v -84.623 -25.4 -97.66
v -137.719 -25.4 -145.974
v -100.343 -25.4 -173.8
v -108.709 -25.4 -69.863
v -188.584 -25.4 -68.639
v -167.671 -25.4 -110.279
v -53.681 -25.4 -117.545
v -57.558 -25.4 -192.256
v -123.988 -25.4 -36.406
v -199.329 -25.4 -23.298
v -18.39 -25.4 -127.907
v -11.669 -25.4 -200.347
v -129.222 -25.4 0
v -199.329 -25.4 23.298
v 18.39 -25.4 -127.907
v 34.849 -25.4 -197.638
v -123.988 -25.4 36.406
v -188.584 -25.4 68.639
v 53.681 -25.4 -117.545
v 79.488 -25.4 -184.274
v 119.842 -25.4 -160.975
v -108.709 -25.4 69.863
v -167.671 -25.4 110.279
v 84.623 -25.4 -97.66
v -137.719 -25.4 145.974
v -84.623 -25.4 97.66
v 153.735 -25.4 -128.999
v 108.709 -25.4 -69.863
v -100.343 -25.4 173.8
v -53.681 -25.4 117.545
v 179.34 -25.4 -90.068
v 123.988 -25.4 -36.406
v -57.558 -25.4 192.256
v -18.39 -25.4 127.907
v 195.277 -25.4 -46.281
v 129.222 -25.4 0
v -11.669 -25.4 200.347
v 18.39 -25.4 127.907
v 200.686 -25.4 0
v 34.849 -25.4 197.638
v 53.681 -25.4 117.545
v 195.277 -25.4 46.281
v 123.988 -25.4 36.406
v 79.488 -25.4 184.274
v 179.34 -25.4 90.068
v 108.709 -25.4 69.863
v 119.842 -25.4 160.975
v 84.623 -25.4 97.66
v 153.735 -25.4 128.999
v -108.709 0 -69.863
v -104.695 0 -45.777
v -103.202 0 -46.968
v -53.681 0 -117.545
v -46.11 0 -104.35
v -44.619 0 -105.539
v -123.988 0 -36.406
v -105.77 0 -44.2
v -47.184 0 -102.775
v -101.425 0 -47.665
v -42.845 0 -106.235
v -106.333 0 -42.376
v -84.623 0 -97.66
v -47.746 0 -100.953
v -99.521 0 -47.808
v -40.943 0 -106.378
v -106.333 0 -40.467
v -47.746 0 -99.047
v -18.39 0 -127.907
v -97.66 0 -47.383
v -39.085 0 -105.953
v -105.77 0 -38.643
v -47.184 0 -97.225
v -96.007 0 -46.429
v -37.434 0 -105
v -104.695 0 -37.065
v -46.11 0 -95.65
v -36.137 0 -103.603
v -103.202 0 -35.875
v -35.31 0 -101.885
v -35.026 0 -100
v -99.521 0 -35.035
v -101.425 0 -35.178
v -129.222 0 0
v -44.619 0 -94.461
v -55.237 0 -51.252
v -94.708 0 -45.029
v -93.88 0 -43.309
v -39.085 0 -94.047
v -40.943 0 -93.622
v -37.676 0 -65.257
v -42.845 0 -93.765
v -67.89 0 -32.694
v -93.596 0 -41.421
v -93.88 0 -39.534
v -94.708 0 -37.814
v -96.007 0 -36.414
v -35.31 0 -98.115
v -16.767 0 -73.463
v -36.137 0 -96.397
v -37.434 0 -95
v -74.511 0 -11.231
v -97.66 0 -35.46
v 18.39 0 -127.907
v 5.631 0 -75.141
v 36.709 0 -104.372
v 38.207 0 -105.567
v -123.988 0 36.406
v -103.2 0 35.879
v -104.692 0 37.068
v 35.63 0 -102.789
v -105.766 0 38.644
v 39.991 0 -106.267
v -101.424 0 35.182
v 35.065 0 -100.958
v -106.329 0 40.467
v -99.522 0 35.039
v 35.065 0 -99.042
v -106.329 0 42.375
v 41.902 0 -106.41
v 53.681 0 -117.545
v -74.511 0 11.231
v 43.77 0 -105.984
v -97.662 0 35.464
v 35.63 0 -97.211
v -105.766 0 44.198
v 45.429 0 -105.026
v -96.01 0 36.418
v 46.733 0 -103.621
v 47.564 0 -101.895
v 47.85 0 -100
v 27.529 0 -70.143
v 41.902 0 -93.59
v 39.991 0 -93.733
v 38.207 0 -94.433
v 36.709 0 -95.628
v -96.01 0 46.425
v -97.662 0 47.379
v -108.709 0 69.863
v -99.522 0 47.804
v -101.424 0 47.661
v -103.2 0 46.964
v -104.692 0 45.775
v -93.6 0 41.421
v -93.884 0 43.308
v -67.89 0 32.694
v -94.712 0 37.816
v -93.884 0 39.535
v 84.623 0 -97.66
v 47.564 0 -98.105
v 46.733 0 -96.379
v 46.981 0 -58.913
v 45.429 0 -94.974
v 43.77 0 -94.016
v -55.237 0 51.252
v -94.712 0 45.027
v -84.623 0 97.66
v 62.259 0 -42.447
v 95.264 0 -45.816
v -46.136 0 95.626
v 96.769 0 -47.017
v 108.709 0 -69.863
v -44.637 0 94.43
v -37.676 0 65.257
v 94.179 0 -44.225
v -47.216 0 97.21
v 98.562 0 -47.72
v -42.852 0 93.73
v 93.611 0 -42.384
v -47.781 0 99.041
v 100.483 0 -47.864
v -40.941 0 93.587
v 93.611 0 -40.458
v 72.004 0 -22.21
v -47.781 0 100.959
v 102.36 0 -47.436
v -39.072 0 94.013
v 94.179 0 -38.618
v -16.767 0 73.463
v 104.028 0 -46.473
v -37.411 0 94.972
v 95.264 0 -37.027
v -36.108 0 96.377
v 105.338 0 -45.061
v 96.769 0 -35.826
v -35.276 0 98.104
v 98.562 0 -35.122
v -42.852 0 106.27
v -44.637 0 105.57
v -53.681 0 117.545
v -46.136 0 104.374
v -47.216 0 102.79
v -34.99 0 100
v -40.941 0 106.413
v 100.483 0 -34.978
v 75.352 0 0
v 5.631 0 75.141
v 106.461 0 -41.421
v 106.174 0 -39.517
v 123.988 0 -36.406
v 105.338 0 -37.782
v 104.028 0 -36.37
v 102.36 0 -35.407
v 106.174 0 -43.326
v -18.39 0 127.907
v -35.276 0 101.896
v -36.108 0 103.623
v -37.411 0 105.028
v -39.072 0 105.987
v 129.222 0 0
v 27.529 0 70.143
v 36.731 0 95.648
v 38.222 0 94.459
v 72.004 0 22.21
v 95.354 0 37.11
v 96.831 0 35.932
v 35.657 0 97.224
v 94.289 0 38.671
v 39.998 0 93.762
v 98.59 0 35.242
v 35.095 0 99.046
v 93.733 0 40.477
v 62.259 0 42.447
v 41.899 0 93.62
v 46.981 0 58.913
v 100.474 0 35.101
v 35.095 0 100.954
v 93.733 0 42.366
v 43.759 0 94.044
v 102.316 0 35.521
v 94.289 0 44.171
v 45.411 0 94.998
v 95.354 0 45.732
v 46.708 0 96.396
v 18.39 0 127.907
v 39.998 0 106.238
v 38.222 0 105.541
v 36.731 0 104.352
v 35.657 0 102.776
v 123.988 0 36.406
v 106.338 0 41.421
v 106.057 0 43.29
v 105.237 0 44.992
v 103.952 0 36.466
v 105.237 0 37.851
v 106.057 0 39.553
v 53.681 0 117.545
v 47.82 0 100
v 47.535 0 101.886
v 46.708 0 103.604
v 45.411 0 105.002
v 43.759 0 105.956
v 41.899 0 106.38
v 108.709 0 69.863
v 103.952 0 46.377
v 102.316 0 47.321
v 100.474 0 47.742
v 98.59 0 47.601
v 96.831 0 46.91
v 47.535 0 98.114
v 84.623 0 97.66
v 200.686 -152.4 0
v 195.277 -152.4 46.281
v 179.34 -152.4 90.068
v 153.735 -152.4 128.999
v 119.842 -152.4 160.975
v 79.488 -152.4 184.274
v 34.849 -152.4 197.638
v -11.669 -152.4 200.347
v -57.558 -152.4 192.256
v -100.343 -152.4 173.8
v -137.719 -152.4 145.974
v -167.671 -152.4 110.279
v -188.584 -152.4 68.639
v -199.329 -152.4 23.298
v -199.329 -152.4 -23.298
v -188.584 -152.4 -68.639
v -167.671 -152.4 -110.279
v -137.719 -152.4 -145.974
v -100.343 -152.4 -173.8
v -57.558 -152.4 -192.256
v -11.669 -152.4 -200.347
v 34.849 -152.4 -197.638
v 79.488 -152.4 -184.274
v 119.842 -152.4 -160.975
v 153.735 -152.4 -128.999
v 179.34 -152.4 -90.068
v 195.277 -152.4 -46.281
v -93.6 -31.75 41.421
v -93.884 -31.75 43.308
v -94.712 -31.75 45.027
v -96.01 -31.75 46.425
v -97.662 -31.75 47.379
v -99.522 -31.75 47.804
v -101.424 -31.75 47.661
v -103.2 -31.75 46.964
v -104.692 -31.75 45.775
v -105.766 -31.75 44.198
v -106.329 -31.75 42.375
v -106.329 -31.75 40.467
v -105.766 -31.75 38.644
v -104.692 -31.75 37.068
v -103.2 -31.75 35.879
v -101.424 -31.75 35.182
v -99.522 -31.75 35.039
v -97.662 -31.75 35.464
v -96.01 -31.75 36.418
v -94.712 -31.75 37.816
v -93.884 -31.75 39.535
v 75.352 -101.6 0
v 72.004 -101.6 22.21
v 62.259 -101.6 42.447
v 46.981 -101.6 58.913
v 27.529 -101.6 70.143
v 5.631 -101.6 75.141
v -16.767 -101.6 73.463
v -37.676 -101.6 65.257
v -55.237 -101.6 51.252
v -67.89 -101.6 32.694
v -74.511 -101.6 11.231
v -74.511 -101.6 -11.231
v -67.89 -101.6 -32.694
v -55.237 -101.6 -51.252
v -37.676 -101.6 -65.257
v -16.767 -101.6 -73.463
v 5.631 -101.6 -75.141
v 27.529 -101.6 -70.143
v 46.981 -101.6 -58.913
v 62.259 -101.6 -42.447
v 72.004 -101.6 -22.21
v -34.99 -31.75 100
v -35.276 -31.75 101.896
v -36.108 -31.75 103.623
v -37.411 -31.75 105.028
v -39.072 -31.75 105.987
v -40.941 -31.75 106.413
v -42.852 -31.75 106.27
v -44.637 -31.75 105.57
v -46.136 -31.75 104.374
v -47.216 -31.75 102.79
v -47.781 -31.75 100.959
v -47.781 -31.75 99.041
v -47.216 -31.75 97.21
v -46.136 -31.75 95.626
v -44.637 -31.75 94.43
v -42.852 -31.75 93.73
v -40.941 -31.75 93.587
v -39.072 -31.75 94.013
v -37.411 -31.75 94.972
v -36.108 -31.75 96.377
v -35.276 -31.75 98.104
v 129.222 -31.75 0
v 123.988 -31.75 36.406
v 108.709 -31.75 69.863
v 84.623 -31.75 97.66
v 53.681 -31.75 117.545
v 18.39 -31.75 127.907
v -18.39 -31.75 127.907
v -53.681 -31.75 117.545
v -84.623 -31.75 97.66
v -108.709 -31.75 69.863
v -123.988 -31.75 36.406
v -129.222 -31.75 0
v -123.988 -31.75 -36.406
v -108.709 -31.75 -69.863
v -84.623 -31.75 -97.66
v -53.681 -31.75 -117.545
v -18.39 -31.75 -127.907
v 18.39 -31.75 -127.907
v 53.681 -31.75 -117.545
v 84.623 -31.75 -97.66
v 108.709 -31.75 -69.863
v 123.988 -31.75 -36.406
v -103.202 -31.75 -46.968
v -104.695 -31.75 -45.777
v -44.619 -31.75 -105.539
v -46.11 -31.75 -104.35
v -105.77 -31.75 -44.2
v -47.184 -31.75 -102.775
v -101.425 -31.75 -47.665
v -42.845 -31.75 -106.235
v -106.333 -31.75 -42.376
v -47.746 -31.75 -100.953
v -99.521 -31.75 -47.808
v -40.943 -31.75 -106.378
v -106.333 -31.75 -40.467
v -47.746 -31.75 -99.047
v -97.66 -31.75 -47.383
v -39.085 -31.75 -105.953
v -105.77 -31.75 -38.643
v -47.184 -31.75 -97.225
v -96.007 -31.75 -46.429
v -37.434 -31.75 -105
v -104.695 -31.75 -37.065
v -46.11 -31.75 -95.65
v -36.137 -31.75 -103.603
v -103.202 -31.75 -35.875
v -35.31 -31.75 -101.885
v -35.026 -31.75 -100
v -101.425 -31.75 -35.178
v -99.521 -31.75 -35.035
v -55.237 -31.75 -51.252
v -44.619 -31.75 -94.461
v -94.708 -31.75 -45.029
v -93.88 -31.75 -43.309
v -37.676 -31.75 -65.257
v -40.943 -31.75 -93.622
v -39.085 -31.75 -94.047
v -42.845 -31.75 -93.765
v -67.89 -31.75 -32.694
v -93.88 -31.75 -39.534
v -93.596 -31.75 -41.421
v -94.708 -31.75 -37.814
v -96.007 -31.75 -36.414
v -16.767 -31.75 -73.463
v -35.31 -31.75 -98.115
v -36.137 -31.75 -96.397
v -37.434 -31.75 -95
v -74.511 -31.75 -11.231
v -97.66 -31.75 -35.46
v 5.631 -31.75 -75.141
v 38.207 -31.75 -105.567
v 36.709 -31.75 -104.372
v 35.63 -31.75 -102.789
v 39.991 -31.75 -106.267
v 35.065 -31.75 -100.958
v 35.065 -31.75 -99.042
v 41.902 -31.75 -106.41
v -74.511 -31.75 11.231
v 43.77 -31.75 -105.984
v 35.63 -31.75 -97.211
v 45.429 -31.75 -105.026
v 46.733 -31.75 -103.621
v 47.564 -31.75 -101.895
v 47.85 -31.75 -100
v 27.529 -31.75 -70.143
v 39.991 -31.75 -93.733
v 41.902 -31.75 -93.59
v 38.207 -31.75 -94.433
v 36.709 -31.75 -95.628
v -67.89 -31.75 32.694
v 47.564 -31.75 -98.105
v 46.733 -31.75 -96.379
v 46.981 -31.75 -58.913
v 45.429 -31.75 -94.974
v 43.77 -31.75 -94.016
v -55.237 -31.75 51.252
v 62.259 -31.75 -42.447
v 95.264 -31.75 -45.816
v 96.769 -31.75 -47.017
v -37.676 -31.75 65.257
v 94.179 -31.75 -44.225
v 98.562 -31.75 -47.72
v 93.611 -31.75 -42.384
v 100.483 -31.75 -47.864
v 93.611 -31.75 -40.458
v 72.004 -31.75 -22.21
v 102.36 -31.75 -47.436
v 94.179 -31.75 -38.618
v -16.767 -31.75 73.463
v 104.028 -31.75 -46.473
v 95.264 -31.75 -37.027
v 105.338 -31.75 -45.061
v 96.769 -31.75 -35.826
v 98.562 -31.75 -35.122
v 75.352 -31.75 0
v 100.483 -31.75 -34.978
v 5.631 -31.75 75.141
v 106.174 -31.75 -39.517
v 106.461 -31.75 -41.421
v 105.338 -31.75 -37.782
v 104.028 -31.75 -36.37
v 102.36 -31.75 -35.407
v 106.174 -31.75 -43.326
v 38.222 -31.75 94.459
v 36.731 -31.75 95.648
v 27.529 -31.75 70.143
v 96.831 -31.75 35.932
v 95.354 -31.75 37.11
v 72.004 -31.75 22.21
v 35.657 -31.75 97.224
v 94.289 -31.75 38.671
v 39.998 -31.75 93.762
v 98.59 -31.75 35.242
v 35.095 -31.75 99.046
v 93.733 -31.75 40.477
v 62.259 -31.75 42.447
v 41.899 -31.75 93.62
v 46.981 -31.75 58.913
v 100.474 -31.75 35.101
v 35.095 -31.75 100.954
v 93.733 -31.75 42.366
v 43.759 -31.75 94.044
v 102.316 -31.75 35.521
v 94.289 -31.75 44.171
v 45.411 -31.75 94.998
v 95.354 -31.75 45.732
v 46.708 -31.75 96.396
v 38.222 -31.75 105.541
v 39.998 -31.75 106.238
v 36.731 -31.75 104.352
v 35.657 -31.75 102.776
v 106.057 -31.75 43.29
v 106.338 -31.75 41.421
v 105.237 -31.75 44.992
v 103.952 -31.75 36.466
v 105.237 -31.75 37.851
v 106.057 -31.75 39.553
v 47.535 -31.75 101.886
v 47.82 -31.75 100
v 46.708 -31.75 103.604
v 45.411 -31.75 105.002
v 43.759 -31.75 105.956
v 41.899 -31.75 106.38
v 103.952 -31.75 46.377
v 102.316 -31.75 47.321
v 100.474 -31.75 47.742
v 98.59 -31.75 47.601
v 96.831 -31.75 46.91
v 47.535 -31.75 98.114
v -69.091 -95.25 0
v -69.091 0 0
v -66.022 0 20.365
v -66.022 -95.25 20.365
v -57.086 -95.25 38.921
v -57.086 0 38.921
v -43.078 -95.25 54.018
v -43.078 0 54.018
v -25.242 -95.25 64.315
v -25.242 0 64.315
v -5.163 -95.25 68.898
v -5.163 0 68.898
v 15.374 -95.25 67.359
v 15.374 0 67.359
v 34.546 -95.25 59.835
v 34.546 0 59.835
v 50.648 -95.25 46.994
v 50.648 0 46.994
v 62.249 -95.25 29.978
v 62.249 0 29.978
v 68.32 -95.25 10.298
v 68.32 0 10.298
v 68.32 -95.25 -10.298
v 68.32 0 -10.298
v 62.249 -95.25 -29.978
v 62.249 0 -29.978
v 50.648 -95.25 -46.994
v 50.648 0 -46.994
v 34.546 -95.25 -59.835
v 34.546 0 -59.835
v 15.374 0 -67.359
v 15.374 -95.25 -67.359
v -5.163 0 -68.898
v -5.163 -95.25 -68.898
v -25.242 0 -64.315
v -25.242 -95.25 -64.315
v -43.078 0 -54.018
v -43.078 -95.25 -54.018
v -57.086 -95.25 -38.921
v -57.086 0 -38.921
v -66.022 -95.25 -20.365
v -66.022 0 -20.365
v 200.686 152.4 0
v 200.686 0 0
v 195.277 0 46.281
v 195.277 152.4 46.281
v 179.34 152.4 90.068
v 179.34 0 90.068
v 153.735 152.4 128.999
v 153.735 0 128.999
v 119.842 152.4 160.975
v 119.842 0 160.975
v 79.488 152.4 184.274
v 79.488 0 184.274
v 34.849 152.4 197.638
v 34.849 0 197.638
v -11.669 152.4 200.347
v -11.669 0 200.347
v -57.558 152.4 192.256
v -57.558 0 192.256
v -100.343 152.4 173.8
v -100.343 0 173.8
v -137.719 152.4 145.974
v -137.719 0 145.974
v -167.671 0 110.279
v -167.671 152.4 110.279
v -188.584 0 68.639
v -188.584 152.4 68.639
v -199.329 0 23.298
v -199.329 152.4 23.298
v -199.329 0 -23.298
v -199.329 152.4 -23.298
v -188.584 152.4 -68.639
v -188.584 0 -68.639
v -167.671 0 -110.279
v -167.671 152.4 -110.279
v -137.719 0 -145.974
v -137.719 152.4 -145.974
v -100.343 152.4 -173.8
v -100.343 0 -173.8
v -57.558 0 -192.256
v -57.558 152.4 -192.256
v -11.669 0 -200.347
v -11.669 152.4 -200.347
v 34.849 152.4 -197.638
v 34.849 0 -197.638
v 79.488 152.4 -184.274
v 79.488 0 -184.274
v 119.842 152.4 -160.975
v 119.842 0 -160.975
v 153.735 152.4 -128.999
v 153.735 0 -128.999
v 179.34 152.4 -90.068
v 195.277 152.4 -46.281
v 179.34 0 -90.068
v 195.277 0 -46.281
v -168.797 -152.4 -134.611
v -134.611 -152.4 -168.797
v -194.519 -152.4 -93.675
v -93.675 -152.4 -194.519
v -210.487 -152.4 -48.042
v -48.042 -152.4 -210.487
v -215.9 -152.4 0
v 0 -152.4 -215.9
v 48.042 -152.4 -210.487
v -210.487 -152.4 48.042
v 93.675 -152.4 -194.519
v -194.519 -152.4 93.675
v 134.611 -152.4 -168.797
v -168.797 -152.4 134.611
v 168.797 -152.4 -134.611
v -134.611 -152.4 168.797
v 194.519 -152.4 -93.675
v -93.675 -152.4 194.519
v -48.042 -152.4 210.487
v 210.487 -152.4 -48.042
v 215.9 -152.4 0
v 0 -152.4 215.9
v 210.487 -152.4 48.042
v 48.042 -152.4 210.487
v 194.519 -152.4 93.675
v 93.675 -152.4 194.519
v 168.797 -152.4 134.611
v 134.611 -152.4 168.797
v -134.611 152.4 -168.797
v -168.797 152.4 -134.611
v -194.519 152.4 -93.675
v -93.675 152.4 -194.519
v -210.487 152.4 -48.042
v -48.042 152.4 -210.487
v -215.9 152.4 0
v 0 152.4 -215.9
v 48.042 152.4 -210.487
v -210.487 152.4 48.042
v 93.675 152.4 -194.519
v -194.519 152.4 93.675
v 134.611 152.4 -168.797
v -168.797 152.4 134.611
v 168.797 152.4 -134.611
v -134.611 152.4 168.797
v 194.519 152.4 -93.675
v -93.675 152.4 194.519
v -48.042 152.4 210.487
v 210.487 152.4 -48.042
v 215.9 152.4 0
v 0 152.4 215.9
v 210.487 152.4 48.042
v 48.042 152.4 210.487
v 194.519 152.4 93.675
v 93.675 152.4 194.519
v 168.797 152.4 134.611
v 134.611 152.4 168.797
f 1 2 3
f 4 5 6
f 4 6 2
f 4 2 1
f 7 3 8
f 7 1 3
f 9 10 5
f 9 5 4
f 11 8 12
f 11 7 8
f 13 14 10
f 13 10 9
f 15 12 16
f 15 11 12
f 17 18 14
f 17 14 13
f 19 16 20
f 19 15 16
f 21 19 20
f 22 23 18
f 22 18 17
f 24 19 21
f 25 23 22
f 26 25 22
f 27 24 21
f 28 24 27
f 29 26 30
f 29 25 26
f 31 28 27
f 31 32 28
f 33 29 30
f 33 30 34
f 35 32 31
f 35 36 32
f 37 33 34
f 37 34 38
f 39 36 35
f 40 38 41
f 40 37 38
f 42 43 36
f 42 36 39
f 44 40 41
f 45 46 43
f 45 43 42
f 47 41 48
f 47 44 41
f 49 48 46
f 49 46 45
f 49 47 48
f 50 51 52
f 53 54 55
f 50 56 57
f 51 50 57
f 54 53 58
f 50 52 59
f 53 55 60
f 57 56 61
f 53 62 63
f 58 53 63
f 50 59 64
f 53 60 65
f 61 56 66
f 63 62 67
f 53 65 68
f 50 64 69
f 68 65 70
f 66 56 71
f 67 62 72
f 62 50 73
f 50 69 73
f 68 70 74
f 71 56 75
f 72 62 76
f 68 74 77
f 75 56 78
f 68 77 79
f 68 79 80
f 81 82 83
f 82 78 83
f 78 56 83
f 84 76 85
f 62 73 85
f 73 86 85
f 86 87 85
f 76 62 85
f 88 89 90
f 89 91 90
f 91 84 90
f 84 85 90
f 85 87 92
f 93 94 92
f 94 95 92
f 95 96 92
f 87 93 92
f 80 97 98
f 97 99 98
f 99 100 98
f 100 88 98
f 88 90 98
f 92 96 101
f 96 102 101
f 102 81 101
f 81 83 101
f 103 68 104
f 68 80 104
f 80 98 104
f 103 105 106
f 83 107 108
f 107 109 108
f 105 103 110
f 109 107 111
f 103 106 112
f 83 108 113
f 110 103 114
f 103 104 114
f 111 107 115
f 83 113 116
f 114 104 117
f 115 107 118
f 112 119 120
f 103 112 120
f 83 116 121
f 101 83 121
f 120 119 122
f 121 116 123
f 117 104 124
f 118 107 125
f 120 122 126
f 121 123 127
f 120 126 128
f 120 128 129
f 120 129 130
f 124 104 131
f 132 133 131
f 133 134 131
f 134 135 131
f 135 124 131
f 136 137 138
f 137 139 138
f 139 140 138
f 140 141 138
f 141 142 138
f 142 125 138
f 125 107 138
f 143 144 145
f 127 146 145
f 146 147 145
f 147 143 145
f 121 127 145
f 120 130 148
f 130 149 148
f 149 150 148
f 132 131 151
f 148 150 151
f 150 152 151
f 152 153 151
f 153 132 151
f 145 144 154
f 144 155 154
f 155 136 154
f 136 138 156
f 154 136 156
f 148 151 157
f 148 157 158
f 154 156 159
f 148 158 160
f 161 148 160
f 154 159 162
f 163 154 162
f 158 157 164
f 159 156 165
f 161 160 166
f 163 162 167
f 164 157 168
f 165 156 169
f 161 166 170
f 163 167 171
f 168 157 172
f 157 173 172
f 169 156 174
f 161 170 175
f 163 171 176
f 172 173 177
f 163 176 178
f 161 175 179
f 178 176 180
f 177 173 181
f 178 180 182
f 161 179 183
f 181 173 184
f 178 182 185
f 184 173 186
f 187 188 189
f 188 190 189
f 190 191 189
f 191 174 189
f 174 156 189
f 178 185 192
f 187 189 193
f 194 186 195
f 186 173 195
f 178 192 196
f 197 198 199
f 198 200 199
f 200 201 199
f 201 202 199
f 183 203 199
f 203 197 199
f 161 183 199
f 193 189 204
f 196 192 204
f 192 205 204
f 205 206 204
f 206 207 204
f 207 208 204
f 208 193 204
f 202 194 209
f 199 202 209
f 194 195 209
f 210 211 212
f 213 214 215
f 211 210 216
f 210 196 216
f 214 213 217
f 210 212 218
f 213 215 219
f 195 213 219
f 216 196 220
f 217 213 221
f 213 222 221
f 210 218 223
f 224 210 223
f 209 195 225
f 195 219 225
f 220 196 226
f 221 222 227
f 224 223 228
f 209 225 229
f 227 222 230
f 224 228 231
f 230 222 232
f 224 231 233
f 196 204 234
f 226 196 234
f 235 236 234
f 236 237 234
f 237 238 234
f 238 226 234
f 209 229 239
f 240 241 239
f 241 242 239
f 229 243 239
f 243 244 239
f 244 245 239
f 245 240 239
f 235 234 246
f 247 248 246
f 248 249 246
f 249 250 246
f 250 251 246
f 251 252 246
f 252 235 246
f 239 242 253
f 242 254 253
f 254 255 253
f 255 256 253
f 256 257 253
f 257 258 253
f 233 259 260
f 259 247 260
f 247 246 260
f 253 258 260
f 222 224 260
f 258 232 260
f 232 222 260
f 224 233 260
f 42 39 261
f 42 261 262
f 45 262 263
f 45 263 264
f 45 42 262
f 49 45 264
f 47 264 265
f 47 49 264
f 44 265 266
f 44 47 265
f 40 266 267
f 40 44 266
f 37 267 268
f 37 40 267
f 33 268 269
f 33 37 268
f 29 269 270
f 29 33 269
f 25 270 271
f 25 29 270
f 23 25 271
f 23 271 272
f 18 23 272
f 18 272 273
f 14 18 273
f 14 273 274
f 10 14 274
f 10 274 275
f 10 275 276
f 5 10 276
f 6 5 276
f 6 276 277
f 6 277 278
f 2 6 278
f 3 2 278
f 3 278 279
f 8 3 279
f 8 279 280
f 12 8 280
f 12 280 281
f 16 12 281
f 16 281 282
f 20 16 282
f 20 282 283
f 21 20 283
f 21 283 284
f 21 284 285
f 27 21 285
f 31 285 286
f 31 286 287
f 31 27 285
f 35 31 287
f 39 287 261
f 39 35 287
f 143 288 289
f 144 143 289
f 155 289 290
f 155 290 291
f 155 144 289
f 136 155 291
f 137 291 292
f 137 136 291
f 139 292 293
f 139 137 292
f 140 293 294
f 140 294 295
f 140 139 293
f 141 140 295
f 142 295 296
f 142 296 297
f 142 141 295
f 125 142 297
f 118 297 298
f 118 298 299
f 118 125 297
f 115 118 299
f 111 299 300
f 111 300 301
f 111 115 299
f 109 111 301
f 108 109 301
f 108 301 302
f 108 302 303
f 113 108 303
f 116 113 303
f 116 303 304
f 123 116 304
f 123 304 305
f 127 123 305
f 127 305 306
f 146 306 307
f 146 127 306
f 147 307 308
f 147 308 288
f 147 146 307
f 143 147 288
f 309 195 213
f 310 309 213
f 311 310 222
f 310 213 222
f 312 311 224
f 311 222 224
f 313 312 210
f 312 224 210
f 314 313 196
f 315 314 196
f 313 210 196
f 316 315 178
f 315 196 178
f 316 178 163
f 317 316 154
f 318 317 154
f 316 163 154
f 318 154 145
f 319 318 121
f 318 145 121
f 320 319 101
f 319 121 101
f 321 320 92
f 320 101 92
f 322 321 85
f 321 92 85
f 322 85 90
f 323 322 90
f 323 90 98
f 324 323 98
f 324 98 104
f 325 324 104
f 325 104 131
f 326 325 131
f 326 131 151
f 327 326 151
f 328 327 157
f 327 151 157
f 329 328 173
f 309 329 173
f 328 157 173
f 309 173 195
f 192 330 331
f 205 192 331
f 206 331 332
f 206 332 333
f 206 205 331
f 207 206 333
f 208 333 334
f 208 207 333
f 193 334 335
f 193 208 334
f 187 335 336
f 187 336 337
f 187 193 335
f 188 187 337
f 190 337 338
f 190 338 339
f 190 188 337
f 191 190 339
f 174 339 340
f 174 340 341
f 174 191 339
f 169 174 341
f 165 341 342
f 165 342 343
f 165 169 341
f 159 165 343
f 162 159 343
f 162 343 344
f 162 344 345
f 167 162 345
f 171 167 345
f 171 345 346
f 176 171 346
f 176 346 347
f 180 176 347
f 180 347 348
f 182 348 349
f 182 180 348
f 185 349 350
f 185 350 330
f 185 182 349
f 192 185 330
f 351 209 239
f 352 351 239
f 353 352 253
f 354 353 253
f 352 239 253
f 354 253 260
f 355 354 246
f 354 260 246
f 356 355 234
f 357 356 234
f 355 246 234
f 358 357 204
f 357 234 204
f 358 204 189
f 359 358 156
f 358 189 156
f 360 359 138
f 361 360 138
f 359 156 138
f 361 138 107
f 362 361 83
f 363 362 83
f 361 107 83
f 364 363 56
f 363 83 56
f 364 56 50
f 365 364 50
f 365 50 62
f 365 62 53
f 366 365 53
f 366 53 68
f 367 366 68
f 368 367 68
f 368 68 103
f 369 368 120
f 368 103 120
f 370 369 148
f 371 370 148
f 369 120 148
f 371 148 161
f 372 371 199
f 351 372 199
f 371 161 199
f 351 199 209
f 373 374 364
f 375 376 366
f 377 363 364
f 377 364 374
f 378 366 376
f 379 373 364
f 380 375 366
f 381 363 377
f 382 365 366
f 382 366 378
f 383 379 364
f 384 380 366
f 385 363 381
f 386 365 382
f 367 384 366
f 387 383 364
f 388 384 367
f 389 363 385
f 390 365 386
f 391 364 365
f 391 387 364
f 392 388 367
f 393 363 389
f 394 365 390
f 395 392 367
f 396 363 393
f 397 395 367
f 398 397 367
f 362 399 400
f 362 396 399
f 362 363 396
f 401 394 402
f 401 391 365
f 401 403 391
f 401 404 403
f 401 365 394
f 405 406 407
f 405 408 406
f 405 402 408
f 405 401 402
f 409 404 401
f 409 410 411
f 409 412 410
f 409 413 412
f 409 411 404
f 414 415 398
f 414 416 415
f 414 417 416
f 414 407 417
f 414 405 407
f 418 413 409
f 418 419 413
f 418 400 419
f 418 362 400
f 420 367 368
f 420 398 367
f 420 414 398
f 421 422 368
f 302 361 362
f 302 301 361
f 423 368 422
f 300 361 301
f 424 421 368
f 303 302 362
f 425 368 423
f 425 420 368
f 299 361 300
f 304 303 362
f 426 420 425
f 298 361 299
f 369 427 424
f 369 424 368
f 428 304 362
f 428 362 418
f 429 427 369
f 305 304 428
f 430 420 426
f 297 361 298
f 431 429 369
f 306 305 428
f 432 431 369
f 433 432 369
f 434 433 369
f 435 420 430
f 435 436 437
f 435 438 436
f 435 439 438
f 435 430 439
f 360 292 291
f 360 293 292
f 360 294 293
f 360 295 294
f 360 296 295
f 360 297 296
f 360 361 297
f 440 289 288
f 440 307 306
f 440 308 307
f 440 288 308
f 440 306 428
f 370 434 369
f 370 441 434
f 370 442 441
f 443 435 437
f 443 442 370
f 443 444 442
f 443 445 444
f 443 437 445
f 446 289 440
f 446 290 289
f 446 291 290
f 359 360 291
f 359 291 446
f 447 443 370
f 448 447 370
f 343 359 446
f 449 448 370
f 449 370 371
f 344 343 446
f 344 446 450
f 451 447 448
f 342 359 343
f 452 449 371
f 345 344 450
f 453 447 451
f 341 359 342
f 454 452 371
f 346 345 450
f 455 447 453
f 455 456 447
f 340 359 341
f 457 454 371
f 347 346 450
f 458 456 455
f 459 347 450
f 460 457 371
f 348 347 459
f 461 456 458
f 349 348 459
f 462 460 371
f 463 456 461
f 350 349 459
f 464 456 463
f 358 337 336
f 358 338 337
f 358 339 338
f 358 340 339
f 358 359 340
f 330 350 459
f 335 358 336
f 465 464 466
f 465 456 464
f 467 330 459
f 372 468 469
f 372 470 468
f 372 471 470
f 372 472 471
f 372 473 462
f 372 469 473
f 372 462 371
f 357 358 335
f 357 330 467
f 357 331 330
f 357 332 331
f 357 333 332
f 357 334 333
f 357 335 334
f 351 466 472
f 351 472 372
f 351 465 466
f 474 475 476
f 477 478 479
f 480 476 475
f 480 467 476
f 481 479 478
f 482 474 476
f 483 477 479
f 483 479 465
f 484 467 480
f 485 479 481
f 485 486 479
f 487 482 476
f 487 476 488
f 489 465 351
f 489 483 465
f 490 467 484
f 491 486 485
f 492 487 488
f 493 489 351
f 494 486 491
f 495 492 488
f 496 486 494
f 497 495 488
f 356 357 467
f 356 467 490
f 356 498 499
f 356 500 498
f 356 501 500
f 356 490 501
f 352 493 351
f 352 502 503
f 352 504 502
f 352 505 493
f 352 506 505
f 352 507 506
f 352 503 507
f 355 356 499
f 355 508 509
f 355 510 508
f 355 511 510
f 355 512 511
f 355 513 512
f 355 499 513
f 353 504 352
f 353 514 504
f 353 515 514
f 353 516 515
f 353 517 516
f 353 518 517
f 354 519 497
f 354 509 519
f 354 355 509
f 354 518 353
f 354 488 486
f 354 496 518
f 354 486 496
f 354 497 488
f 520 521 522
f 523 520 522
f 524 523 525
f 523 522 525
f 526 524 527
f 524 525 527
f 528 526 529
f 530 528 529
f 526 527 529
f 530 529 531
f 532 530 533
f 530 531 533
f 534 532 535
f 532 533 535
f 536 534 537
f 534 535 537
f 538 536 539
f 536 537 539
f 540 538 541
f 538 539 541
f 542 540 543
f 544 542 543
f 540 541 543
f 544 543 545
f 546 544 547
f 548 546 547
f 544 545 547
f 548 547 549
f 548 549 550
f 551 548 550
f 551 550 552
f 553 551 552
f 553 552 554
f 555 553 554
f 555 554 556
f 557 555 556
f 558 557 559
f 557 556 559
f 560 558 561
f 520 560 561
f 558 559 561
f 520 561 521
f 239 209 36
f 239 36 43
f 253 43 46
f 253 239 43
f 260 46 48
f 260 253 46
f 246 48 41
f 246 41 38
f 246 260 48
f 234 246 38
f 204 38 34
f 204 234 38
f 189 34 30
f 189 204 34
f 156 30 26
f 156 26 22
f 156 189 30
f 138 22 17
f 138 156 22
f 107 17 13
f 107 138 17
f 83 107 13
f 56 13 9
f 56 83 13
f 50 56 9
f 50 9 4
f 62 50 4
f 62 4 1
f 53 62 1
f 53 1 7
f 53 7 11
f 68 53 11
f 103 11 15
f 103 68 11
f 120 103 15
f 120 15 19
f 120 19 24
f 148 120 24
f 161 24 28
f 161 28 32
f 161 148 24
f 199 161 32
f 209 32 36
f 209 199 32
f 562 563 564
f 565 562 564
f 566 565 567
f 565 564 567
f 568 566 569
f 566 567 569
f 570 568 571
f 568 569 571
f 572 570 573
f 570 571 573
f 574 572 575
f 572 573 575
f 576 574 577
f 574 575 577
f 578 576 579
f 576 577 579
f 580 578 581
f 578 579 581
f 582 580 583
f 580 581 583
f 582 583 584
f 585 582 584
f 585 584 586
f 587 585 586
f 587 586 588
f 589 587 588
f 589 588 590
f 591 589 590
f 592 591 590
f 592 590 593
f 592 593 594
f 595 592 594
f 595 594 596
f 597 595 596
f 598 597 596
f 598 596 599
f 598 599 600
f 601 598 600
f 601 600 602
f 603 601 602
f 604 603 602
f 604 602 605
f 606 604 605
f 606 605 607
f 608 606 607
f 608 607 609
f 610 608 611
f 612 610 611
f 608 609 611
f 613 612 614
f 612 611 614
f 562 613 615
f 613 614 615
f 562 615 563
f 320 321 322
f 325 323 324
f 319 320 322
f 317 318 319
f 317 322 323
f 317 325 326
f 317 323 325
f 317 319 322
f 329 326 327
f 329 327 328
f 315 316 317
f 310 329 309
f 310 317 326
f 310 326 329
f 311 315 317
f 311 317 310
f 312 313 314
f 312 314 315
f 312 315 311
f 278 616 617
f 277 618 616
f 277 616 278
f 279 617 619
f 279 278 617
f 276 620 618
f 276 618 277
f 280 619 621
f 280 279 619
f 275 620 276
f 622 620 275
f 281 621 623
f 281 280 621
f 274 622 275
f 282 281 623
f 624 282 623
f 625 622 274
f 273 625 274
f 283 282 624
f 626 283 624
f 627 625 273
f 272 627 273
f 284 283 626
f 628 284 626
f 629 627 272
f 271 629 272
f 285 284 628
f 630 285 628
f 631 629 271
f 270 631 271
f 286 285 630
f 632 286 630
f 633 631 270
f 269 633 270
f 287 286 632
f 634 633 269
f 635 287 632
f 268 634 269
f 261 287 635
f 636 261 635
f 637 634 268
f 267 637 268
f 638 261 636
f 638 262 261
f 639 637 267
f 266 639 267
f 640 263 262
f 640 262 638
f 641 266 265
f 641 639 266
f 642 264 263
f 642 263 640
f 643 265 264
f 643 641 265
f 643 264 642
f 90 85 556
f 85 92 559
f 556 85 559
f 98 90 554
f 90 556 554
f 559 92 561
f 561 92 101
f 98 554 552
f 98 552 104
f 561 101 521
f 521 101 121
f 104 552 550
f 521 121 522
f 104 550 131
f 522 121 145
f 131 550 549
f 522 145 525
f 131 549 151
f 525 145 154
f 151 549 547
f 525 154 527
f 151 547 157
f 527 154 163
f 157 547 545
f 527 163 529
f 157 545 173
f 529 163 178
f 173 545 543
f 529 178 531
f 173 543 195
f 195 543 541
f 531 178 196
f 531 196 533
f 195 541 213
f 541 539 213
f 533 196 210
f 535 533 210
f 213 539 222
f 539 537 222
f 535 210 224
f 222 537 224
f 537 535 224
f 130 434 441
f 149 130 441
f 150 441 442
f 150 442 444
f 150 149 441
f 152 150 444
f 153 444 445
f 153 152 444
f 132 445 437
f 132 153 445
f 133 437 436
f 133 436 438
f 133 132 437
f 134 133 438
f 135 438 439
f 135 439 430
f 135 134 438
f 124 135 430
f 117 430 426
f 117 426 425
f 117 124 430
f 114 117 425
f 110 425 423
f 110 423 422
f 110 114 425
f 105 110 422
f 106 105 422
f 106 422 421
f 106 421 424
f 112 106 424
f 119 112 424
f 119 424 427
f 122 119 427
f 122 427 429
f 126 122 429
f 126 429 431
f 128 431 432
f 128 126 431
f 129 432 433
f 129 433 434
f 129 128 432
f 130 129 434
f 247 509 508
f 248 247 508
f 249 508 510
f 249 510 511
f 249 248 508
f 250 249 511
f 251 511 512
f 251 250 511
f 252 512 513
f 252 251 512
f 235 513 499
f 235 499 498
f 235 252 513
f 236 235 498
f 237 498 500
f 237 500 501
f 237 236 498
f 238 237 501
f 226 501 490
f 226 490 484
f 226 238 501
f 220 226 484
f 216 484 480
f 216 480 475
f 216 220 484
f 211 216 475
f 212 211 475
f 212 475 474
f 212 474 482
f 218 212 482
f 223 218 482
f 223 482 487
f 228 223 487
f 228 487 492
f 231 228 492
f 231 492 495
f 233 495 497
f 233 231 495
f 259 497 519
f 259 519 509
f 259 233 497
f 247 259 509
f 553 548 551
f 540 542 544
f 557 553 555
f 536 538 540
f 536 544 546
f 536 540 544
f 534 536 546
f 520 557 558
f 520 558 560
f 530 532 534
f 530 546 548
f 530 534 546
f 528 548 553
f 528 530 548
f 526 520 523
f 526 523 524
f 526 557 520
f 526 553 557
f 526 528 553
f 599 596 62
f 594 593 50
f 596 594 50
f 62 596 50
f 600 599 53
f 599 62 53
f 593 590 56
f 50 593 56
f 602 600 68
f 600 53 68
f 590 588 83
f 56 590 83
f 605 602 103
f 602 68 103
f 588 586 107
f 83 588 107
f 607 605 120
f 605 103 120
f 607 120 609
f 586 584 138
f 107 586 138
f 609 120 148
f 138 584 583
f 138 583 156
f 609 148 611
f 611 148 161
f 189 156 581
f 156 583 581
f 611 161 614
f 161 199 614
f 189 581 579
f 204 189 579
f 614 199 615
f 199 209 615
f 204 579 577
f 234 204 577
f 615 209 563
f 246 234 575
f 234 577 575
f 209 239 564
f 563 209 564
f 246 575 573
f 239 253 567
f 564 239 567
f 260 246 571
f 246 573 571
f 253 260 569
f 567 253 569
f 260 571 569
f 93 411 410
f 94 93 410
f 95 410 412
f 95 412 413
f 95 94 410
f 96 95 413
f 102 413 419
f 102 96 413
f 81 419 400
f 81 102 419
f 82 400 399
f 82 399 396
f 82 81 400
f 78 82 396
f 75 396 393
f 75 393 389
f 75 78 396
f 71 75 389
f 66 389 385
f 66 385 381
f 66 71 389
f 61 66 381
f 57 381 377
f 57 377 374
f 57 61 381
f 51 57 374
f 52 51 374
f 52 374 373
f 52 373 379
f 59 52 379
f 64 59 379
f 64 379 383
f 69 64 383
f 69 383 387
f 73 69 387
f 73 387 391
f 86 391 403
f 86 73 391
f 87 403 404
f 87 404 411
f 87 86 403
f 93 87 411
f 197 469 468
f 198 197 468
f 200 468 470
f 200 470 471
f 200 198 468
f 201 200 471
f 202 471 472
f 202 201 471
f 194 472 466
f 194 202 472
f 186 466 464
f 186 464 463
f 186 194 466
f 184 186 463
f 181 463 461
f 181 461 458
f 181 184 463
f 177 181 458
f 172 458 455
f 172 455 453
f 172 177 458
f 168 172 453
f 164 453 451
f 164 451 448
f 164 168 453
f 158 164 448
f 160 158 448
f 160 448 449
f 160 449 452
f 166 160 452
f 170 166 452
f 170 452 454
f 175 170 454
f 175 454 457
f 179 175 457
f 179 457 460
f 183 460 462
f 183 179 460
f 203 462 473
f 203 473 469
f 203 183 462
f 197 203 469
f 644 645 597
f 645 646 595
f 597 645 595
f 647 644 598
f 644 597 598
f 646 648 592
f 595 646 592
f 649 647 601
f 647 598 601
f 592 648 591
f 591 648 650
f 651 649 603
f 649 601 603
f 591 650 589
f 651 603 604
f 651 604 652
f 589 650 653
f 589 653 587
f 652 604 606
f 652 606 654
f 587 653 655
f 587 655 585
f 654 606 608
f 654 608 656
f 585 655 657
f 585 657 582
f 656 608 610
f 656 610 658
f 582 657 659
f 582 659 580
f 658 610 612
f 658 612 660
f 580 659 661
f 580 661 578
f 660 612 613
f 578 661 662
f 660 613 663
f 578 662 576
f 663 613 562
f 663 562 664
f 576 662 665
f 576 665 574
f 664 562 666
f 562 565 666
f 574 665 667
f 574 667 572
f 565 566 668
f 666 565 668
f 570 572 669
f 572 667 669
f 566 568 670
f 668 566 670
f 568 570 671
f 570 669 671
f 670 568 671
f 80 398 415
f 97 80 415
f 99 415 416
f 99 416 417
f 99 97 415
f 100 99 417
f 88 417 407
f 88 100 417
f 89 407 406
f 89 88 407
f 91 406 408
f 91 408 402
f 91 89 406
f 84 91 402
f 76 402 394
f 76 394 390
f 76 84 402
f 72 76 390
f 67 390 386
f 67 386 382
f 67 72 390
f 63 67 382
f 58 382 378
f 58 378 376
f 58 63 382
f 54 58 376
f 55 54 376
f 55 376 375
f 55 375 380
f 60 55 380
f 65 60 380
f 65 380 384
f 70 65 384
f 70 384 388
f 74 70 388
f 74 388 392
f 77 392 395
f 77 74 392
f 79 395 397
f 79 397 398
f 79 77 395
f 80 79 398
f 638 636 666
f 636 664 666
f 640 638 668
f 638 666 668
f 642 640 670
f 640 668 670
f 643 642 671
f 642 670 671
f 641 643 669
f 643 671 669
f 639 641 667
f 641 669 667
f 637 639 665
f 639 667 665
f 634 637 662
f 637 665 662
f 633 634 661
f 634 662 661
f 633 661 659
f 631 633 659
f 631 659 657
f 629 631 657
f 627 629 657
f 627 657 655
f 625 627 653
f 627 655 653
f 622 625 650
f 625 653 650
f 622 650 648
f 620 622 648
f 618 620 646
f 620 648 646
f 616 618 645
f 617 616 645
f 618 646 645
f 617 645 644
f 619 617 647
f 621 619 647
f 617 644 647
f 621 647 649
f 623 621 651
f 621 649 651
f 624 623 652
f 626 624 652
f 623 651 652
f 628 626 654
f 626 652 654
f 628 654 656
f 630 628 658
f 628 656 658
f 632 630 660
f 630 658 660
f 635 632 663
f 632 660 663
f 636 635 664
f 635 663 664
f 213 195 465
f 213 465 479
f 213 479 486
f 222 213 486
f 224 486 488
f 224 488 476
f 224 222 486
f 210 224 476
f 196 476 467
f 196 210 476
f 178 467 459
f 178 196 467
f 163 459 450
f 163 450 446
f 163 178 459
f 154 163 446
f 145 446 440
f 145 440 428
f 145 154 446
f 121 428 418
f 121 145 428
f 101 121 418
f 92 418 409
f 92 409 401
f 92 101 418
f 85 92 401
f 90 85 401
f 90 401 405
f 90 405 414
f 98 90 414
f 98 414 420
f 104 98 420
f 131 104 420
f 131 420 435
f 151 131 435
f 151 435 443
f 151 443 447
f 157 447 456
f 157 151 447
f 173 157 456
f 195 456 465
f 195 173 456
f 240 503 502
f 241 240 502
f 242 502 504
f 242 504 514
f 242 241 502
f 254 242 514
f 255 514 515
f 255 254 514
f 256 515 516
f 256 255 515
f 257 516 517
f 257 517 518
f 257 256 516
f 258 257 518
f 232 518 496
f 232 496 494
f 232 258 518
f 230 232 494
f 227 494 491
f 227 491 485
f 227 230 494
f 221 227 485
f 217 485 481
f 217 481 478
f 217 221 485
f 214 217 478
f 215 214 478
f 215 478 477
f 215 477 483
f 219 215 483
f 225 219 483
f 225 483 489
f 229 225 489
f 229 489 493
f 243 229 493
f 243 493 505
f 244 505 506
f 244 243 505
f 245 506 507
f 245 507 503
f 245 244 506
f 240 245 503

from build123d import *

# Parameters (mm, degrees)
F0_R        = 215.9
F0_R_2      = 200.686457
F1_DEPTH    = 152.4
F0_R_3      = 129.222309
F2_DEPTH    = 25.4
F0_R_4      = 75.352171
F3_DEPTH    = 101.6
F0_R_5      = 6.395598
F0_R_6      = 6.404413
F0_R_7      = 6.428406
F0_R_8      = 6.461019
F0_R_9      = 6.400123
F0_R_10     = 6.431327
F0_R_11     = 6.338285
F0_R_12     = 6.398191
F4_DEPTH    = 31.75
F5_R        = 69.091318
F6_DEPTH    = 95.25
F1_FACE_R   = 215.9
F1_FACE_R_2 = 200.686457
F7_DEPTH    = 304.8


with BuildPart() as f1:
    # F0 (on Front) → F1 (new body)
    with BuildSketch(Plane.XZ):
        Circle(F0_R)
        Circle(F0_R_2, mode=Mode.SUBTRACT)
    extrude(amount=F1_DEPTH)

    # F0 (on Front) → F2 (join)
    with BuildSketch(Plane.XZ):
        Circle(F0_R_2)
        Circle(F0_R_3, mode=Mode.SUBTRACT)
    extrude(amount=F2_DEPTH)

    # F1_face (on face) → F7 (join)
    with BuildSketch(Plane.XZ.offset(152.4)):
        Circle(F1_FACE_R)
        Circle(F1_FACE_R_2, mode=Mode.SUBTRACT)
    extrude(amount=-F7_DEPTH)


with BuildPart() as f3:
    # F0 (on Front) → F3 (new body)
    with BuildSketch(Plane.XZ):
        Circle(F0_R_4)
    extrude(amount=F3_DEPTH)

    # F5 (on face) → F6 (cut)
    with BuildSketch(Plane(origin=(0, 0, 0), x_dir=(-1, 0, 0), z_dir=(0, 1, 0))):
        Circle(F5_R)
    extrude(amount=-F6_DEPTH, mode=Mode.SUBTRACT)


with BuildPart() as f4:
    # F0 (on Front) → F4 (new body)
    with BuildSketch(Plane.XZ):
        Circle(F0_R_3)
        with Locations((-41.421356, -100)):
            Circle(F0_R_5, mode=Mode.SUBTRACT)
        with Locations((-100, -41.421356)):
            Circle(F0_R_6, mode=Mode.SUBTRACT)
        with Locations((41.421356, -100)):
            Circle(F0_R_7, mode=Mode.SUBTRACT)
        with Locations((100, -41.421356)):
            Circle(F0_R_8, mode=Mode.SUBTRACT)
        with Locations((-100, 41.421356)):
            Circle(F0_R_9, mode=Mode.SUBTRACT)
        with Locations((-41.421356, 100)):
            Circle(F0_R_10, mode=Mode.SUBTRACT)
        Circle(F0_R_4, mode=Mode.SUBTRACT)
        with Locations((100, 41.421356)):
            Circle(F0_R_11, mode=Mode.SUBTRACT)
        with Locations((41.421356, 100)):
            Circle(F0_R_12, mode=Mode.SUBTRACT)
    extrude(amount=F4_DEPTH)


solid = Compound([f1.part, f3.part, f4.part])
